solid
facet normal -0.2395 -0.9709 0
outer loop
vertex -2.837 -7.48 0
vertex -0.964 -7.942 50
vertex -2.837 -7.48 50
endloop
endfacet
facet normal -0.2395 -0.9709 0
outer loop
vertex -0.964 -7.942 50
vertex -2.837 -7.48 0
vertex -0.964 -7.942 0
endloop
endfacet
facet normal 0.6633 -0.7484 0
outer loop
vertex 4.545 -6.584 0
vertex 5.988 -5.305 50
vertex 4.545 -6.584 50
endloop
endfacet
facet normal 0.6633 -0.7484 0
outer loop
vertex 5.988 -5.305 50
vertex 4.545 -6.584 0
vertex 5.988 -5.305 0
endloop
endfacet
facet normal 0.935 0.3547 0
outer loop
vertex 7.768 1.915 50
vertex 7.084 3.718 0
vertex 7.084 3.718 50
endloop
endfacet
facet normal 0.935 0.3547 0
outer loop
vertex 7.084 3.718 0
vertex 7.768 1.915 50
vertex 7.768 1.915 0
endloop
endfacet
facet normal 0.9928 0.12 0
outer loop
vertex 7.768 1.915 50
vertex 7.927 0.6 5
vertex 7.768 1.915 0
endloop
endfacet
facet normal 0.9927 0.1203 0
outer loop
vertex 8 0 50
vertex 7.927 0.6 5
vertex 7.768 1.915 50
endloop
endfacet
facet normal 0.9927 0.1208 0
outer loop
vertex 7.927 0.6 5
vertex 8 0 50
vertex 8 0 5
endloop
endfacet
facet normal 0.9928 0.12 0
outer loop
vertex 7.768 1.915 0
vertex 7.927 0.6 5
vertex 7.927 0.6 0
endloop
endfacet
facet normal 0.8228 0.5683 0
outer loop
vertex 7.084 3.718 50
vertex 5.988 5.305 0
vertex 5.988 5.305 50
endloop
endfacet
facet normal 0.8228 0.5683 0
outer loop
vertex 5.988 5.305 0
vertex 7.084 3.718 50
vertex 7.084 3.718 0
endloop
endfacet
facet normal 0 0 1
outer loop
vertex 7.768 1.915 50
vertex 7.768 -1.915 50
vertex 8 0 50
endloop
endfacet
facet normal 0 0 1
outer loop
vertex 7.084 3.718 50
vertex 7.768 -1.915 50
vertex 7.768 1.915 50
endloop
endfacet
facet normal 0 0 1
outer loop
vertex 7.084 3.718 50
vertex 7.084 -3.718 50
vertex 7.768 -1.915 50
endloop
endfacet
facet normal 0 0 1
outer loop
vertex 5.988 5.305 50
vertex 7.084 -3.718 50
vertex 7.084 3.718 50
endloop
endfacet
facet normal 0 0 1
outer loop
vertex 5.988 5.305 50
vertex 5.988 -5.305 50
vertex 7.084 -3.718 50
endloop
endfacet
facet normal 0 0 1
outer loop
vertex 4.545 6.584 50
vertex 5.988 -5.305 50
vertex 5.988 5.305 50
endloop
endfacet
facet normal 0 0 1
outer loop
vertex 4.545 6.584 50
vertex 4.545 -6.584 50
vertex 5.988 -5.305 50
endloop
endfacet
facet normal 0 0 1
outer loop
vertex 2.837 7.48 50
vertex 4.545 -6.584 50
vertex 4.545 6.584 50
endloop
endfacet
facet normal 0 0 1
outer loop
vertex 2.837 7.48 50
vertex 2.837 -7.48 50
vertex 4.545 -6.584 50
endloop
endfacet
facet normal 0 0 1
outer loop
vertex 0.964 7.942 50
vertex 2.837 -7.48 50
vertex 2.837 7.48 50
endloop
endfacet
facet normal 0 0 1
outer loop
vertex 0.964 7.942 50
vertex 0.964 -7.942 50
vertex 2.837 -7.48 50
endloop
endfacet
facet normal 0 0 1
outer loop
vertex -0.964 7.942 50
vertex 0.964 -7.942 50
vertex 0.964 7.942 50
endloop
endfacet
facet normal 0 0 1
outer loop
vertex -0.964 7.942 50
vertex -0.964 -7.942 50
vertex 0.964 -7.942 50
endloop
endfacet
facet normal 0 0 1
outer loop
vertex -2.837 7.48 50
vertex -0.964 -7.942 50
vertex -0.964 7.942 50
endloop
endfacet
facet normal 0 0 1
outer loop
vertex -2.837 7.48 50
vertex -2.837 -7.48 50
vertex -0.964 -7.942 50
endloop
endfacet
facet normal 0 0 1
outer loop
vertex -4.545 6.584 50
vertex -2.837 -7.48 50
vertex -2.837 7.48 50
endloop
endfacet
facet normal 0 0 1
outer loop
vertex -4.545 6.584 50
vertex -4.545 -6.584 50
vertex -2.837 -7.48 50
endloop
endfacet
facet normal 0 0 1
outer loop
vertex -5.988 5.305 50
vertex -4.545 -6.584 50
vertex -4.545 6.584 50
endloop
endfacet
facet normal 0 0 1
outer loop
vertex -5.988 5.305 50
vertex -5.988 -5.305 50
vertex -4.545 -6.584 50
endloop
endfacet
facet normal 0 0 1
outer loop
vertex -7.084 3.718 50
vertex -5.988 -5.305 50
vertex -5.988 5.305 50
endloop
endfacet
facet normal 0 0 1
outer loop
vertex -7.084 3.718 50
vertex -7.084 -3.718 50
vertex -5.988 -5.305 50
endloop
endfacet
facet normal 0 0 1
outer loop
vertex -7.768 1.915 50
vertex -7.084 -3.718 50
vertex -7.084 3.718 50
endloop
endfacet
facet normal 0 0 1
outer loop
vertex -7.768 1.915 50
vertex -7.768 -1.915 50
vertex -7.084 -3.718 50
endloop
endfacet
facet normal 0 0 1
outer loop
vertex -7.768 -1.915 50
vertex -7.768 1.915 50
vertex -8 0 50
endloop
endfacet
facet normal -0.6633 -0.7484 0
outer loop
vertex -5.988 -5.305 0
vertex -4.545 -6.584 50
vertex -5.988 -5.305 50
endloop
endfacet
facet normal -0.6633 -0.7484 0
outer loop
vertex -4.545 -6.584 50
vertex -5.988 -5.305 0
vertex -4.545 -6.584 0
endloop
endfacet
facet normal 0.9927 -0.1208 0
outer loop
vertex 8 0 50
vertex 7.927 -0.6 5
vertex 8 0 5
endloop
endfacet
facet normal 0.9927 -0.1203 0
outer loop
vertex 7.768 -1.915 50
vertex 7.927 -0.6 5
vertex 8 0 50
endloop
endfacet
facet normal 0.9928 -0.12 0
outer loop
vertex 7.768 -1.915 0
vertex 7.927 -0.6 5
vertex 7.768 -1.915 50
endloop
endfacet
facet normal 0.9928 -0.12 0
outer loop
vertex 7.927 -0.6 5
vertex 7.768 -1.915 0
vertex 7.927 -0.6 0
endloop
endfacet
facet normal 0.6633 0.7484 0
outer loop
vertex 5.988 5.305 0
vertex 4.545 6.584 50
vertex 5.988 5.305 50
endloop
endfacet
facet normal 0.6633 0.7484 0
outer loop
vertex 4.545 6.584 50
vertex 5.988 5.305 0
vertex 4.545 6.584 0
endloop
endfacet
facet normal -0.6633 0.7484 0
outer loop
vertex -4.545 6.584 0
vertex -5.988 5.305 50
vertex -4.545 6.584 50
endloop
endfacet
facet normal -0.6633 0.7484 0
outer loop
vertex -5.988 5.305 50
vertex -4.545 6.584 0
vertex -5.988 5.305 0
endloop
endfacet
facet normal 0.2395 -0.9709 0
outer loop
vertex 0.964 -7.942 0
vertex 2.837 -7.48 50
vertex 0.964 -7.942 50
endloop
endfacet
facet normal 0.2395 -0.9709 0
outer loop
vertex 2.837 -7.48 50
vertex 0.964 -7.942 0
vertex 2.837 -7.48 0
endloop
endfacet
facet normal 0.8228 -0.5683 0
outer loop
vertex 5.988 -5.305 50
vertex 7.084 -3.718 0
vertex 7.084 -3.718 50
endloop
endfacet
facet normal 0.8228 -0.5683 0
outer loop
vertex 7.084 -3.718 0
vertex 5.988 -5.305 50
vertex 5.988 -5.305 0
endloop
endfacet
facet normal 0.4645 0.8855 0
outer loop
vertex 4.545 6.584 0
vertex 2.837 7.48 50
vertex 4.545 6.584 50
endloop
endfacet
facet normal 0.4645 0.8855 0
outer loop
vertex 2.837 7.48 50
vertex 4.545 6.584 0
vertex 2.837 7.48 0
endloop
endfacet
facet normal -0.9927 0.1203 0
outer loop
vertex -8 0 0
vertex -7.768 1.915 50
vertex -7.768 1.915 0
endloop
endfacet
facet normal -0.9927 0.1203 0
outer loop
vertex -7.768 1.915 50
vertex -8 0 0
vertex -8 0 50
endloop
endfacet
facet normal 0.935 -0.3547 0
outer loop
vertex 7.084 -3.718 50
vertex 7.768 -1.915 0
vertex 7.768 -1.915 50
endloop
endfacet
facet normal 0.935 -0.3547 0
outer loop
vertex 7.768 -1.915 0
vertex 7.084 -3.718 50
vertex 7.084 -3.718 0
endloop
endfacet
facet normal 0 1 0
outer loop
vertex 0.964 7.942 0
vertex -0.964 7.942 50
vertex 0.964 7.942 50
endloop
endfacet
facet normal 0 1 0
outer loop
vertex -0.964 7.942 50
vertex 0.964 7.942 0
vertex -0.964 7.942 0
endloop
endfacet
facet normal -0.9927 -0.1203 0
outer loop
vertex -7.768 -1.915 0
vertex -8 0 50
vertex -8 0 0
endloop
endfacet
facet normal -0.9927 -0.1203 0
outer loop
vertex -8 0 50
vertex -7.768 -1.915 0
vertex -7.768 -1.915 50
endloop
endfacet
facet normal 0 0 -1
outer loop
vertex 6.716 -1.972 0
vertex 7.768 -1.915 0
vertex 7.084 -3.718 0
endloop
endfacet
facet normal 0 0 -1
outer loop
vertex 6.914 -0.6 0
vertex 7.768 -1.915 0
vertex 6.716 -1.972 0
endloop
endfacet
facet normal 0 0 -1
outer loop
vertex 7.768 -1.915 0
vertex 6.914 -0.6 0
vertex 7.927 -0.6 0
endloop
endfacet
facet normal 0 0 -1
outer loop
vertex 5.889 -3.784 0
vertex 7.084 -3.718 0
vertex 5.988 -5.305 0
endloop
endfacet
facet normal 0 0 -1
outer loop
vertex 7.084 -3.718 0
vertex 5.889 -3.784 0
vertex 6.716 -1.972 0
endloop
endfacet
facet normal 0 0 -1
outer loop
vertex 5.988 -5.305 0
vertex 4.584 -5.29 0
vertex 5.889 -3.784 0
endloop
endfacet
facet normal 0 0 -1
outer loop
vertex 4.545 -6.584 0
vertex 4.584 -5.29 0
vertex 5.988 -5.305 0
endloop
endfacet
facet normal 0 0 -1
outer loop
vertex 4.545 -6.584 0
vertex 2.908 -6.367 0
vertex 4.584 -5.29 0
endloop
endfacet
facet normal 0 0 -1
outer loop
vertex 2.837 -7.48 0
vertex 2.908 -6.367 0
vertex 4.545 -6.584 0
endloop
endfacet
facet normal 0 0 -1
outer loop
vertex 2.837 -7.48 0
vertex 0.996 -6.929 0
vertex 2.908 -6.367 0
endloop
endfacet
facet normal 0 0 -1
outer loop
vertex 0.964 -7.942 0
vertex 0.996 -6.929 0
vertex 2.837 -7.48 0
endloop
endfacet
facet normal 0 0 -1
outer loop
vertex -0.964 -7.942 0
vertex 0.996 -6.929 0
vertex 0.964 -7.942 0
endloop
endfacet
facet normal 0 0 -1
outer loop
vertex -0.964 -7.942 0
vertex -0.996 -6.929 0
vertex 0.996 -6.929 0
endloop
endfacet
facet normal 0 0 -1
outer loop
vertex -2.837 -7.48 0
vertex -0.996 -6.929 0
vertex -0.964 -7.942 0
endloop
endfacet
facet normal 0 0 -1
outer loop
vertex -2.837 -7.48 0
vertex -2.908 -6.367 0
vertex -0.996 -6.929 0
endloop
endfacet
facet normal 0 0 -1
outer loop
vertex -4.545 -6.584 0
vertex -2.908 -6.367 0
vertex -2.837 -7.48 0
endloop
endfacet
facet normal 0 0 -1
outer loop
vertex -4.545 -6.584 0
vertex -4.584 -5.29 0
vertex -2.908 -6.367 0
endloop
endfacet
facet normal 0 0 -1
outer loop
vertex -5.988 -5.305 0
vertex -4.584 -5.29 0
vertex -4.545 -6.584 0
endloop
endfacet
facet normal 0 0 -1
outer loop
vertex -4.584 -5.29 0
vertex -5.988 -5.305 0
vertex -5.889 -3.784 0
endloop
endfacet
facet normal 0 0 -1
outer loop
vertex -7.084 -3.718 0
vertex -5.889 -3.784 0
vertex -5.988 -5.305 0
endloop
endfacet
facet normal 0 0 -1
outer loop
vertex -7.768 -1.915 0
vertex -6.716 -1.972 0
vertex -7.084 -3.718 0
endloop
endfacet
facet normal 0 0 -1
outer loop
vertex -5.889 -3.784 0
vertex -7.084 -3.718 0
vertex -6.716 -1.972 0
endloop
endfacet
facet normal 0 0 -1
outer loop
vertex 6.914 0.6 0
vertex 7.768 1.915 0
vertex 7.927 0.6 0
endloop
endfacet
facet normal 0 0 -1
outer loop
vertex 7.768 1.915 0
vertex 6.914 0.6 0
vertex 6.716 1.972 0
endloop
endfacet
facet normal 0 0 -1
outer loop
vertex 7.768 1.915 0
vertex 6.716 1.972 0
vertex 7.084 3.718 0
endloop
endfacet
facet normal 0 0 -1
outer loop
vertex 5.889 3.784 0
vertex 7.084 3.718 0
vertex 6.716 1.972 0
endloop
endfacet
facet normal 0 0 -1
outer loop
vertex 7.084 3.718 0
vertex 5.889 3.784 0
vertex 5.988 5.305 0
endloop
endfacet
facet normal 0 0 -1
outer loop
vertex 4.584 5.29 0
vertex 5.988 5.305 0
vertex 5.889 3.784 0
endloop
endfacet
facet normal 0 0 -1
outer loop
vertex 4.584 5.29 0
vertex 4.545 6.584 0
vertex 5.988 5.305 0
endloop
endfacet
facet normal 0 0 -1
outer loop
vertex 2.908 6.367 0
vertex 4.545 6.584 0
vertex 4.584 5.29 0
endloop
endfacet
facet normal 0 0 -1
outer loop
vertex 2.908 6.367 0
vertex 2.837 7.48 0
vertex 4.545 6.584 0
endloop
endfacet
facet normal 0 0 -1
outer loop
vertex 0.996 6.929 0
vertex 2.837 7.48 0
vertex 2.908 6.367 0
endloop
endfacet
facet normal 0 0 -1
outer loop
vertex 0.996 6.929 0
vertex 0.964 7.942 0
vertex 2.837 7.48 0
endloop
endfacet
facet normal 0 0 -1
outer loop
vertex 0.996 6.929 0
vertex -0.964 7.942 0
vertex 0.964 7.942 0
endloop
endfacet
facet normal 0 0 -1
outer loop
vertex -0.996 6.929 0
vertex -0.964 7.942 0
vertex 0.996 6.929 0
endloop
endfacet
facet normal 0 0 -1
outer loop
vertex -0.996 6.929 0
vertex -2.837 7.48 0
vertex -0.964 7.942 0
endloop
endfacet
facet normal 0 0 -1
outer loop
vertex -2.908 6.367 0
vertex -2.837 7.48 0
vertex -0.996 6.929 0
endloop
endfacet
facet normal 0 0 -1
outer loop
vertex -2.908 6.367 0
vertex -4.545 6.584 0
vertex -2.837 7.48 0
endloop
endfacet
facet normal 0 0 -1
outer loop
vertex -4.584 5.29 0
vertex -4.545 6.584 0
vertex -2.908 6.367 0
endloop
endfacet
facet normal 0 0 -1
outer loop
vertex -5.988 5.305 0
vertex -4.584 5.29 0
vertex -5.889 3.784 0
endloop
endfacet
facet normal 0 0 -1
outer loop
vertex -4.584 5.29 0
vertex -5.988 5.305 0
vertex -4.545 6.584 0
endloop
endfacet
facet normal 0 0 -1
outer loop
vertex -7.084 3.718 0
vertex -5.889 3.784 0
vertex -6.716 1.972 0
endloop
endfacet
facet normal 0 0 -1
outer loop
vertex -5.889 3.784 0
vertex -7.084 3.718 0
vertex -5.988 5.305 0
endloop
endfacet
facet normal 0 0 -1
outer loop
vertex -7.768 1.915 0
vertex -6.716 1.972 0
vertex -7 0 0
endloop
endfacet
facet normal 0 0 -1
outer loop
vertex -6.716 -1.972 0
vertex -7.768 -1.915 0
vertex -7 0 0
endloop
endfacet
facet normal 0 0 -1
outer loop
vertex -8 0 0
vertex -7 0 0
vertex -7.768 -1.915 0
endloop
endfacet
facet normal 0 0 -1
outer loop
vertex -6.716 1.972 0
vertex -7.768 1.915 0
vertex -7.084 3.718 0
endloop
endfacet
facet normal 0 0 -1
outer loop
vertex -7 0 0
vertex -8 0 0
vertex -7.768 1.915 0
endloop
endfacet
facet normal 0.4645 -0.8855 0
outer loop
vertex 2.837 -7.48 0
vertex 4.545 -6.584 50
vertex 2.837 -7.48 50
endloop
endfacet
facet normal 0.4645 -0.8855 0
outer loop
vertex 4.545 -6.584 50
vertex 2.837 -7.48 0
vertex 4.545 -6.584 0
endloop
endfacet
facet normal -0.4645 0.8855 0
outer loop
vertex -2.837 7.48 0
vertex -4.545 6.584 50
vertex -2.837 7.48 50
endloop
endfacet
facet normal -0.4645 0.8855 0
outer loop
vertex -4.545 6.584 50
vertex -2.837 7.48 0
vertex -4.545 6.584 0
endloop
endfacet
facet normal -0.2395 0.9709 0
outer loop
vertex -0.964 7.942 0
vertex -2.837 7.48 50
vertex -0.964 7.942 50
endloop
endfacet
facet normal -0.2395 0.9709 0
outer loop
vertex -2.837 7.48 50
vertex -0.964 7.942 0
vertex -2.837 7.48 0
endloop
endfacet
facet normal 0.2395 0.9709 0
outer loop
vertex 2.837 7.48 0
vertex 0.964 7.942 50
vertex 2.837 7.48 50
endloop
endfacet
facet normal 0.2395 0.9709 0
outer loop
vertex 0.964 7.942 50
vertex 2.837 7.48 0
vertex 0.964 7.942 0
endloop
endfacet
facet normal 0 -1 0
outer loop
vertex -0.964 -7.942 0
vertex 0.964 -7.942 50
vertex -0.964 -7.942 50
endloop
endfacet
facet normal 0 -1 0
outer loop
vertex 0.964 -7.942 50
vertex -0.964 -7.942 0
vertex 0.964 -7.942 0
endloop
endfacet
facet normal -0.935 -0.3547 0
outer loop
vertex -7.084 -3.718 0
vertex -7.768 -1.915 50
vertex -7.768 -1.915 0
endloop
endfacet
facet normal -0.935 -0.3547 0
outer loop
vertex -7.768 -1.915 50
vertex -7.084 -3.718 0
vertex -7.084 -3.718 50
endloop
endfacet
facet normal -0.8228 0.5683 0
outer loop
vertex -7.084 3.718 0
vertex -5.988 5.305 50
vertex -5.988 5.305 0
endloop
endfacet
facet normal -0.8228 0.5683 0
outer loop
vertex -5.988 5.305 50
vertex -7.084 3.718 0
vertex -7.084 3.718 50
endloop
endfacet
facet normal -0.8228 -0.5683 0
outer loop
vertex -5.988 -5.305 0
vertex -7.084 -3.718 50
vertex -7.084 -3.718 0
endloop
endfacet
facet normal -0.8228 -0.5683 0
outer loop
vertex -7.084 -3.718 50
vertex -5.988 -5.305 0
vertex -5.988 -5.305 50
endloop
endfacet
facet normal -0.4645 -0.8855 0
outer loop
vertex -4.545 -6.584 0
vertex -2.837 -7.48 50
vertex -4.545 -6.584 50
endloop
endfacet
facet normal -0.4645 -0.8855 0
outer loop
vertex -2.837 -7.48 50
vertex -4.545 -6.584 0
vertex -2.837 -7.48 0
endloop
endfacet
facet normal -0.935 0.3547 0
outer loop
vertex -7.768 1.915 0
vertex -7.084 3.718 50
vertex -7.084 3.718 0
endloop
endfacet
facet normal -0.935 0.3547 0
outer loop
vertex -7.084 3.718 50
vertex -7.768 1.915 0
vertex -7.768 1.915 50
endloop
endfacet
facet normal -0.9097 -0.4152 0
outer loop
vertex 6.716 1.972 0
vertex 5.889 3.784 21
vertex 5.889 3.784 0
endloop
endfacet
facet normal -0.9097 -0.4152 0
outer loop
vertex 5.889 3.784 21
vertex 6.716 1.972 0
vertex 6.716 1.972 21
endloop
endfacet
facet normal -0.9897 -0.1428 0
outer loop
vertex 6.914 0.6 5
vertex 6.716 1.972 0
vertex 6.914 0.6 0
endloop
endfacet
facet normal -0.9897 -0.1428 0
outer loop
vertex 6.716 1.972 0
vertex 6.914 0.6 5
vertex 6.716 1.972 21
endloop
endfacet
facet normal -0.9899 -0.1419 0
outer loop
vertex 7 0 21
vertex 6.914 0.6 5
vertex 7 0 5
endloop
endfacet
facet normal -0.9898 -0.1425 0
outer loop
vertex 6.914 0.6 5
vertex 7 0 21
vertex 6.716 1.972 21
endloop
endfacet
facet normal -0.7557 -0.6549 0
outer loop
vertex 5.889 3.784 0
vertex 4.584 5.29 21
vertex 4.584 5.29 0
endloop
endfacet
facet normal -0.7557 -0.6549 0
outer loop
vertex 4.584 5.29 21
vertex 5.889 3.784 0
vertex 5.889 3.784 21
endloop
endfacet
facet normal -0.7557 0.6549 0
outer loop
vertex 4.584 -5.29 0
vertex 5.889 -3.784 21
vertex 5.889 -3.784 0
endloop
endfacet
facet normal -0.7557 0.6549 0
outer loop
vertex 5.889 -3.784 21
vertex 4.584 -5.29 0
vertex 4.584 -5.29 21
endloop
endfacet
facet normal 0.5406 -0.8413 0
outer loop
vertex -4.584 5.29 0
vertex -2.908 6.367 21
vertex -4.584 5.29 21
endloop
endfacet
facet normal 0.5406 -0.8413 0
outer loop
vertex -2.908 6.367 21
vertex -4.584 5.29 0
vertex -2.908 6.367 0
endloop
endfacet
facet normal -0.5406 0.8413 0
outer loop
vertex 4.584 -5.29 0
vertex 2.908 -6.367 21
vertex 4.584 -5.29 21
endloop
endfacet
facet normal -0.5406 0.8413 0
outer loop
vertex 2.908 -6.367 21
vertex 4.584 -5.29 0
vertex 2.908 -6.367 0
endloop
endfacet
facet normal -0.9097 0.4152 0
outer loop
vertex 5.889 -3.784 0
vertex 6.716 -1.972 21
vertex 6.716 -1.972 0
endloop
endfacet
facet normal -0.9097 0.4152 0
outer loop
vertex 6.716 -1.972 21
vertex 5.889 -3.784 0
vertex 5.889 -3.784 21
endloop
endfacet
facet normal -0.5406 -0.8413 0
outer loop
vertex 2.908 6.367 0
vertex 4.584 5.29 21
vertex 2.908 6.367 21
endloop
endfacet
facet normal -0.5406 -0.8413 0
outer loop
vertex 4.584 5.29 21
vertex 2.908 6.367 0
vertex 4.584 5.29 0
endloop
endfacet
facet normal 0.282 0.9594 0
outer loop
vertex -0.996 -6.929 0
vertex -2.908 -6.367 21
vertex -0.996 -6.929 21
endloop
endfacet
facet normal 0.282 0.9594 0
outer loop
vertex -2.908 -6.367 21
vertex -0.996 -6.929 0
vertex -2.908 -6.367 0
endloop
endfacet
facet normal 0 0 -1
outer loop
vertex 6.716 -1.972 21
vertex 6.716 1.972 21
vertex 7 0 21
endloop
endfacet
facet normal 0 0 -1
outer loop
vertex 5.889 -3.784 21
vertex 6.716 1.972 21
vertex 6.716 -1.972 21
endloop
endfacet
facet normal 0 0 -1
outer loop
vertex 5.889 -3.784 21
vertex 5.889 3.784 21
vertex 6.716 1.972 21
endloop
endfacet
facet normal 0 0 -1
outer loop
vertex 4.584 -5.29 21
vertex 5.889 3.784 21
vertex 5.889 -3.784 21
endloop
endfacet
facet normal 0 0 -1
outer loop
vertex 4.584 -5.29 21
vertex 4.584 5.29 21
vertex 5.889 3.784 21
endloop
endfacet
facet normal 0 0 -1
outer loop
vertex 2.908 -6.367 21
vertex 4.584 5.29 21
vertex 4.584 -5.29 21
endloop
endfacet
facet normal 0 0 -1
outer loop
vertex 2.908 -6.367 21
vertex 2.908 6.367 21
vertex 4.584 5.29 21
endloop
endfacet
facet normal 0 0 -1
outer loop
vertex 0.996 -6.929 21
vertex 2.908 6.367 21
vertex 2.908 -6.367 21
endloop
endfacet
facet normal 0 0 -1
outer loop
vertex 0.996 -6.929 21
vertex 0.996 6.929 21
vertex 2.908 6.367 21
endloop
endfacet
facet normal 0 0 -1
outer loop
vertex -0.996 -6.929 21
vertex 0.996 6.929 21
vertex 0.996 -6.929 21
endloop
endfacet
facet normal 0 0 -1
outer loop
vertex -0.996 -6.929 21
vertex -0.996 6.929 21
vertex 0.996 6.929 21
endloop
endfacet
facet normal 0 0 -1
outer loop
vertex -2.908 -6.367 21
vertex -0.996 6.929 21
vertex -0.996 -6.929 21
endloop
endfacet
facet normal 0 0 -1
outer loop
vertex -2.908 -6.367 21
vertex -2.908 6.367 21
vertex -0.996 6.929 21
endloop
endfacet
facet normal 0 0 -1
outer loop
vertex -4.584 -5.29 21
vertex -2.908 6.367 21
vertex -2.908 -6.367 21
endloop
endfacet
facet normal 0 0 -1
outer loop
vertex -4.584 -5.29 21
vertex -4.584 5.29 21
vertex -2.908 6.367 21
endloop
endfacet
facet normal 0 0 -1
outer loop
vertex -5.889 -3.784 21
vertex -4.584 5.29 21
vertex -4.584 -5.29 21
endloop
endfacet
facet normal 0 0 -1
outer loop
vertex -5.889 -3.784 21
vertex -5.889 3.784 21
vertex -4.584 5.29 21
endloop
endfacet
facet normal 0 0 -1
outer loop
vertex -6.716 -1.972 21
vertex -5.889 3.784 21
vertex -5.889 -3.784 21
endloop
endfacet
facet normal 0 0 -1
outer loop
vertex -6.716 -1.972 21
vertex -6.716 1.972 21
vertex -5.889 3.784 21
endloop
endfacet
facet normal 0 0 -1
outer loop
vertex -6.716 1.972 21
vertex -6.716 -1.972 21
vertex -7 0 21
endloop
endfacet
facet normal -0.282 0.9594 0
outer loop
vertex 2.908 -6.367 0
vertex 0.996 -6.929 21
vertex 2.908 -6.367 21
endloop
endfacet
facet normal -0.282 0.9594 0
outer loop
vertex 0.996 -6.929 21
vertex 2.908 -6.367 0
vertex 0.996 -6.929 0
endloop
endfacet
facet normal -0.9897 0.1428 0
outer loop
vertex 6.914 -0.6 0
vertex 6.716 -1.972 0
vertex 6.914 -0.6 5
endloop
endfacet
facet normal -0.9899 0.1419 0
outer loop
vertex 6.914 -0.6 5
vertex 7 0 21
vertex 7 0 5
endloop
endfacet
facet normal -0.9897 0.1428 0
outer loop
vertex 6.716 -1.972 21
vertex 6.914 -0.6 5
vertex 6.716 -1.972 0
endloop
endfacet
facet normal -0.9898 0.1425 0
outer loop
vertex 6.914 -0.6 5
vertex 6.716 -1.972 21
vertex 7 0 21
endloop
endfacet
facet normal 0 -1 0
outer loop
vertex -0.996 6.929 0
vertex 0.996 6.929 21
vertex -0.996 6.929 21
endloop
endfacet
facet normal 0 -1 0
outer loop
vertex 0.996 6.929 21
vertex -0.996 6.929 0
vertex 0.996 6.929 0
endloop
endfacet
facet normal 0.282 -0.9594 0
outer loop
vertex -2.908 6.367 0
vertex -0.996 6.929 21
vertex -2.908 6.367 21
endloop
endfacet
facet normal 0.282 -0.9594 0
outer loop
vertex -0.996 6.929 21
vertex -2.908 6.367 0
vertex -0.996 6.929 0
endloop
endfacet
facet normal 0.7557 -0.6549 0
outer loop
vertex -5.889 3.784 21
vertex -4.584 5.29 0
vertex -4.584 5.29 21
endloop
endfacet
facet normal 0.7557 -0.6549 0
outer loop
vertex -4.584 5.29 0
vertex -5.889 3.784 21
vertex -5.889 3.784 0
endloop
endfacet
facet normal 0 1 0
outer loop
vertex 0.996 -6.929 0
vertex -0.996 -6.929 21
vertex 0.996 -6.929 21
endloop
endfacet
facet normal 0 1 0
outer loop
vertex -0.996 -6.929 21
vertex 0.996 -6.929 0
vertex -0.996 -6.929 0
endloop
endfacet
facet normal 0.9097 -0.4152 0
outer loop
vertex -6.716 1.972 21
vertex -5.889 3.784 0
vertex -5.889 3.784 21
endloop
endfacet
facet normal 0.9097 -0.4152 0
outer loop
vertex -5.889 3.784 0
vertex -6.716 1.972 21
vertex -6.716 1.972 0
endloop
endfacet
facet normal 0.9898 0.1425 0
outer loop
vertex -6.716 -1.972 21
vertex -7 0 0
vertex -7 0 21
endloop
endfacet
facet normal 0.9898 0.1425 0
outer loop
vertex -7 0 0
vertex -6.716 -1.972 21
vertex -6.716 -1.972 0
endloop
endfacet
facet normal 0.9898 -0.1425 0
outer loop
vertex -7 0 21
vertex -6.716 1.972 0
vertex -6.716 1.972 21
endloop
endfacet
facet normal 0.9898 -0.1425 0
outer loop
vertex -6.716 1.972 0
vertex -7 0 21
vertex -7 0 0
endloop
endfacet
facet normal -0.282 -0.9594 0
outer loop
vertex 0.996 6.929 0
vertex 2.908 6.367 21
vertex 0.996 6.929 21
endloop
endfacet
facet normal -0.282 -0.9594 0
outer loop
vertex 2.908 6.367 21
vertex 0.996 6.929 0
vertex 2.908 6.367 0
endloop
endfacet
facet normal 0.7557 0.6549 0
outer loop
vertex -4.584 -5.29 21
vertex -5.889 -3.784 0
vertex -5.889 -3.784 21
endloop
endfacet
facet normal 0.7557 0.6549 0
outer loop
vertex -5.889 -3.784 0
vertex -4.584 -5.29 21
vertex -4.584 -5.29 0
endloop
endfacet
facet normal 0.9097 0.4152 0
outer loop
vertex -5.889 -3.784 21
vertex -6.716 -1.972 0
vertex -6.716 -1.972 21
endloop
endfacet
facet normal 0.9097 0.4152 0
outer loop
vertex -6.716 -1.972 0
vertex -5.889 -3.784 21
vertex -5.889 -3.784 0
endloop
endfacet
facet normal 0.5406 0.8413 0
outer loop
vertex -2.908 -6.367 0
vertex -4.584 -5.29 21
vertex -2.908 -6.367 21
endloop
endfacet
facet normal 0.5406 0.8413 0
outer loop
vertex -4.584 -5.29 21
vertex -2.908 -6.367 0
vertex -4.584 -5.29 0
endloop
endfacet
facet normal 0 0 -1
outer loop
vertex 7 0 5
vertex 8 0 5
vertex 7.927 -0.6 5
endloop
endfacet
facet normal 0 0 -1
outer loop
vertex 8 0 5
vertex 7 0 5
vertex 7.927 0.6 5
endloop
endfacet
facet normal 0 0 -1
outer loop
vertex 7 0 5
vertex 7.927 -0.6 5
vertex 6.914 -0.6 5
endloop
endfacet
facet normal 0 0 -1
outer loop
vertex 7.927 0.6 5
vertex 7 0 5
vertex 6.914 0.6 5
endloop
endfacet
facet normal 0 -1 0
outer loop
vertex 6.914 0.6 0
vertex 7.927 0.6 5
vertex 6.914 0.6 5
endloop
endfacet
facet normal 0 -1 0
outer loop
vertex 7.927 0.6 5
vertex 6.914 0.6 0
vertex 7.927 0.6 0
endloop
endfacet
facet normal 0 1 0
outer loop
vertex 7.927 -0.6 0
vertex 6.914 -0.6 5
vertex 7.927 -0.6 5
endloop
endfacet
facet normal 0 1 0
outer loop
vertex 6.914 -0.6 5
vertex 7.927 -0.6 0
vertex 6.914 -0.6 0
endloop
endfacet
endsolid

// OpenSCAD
//Special tool for fitting the spring on a 1990s - 2000s era VW door lock.
//As found in Polo 6Ns and contemporary cars.


difference(){
    cylinder (50,8,8,false);
    cylinder (21,7,7,false);
    translate([0,-0.6,0]) cube([10,1.2,5]);
}
